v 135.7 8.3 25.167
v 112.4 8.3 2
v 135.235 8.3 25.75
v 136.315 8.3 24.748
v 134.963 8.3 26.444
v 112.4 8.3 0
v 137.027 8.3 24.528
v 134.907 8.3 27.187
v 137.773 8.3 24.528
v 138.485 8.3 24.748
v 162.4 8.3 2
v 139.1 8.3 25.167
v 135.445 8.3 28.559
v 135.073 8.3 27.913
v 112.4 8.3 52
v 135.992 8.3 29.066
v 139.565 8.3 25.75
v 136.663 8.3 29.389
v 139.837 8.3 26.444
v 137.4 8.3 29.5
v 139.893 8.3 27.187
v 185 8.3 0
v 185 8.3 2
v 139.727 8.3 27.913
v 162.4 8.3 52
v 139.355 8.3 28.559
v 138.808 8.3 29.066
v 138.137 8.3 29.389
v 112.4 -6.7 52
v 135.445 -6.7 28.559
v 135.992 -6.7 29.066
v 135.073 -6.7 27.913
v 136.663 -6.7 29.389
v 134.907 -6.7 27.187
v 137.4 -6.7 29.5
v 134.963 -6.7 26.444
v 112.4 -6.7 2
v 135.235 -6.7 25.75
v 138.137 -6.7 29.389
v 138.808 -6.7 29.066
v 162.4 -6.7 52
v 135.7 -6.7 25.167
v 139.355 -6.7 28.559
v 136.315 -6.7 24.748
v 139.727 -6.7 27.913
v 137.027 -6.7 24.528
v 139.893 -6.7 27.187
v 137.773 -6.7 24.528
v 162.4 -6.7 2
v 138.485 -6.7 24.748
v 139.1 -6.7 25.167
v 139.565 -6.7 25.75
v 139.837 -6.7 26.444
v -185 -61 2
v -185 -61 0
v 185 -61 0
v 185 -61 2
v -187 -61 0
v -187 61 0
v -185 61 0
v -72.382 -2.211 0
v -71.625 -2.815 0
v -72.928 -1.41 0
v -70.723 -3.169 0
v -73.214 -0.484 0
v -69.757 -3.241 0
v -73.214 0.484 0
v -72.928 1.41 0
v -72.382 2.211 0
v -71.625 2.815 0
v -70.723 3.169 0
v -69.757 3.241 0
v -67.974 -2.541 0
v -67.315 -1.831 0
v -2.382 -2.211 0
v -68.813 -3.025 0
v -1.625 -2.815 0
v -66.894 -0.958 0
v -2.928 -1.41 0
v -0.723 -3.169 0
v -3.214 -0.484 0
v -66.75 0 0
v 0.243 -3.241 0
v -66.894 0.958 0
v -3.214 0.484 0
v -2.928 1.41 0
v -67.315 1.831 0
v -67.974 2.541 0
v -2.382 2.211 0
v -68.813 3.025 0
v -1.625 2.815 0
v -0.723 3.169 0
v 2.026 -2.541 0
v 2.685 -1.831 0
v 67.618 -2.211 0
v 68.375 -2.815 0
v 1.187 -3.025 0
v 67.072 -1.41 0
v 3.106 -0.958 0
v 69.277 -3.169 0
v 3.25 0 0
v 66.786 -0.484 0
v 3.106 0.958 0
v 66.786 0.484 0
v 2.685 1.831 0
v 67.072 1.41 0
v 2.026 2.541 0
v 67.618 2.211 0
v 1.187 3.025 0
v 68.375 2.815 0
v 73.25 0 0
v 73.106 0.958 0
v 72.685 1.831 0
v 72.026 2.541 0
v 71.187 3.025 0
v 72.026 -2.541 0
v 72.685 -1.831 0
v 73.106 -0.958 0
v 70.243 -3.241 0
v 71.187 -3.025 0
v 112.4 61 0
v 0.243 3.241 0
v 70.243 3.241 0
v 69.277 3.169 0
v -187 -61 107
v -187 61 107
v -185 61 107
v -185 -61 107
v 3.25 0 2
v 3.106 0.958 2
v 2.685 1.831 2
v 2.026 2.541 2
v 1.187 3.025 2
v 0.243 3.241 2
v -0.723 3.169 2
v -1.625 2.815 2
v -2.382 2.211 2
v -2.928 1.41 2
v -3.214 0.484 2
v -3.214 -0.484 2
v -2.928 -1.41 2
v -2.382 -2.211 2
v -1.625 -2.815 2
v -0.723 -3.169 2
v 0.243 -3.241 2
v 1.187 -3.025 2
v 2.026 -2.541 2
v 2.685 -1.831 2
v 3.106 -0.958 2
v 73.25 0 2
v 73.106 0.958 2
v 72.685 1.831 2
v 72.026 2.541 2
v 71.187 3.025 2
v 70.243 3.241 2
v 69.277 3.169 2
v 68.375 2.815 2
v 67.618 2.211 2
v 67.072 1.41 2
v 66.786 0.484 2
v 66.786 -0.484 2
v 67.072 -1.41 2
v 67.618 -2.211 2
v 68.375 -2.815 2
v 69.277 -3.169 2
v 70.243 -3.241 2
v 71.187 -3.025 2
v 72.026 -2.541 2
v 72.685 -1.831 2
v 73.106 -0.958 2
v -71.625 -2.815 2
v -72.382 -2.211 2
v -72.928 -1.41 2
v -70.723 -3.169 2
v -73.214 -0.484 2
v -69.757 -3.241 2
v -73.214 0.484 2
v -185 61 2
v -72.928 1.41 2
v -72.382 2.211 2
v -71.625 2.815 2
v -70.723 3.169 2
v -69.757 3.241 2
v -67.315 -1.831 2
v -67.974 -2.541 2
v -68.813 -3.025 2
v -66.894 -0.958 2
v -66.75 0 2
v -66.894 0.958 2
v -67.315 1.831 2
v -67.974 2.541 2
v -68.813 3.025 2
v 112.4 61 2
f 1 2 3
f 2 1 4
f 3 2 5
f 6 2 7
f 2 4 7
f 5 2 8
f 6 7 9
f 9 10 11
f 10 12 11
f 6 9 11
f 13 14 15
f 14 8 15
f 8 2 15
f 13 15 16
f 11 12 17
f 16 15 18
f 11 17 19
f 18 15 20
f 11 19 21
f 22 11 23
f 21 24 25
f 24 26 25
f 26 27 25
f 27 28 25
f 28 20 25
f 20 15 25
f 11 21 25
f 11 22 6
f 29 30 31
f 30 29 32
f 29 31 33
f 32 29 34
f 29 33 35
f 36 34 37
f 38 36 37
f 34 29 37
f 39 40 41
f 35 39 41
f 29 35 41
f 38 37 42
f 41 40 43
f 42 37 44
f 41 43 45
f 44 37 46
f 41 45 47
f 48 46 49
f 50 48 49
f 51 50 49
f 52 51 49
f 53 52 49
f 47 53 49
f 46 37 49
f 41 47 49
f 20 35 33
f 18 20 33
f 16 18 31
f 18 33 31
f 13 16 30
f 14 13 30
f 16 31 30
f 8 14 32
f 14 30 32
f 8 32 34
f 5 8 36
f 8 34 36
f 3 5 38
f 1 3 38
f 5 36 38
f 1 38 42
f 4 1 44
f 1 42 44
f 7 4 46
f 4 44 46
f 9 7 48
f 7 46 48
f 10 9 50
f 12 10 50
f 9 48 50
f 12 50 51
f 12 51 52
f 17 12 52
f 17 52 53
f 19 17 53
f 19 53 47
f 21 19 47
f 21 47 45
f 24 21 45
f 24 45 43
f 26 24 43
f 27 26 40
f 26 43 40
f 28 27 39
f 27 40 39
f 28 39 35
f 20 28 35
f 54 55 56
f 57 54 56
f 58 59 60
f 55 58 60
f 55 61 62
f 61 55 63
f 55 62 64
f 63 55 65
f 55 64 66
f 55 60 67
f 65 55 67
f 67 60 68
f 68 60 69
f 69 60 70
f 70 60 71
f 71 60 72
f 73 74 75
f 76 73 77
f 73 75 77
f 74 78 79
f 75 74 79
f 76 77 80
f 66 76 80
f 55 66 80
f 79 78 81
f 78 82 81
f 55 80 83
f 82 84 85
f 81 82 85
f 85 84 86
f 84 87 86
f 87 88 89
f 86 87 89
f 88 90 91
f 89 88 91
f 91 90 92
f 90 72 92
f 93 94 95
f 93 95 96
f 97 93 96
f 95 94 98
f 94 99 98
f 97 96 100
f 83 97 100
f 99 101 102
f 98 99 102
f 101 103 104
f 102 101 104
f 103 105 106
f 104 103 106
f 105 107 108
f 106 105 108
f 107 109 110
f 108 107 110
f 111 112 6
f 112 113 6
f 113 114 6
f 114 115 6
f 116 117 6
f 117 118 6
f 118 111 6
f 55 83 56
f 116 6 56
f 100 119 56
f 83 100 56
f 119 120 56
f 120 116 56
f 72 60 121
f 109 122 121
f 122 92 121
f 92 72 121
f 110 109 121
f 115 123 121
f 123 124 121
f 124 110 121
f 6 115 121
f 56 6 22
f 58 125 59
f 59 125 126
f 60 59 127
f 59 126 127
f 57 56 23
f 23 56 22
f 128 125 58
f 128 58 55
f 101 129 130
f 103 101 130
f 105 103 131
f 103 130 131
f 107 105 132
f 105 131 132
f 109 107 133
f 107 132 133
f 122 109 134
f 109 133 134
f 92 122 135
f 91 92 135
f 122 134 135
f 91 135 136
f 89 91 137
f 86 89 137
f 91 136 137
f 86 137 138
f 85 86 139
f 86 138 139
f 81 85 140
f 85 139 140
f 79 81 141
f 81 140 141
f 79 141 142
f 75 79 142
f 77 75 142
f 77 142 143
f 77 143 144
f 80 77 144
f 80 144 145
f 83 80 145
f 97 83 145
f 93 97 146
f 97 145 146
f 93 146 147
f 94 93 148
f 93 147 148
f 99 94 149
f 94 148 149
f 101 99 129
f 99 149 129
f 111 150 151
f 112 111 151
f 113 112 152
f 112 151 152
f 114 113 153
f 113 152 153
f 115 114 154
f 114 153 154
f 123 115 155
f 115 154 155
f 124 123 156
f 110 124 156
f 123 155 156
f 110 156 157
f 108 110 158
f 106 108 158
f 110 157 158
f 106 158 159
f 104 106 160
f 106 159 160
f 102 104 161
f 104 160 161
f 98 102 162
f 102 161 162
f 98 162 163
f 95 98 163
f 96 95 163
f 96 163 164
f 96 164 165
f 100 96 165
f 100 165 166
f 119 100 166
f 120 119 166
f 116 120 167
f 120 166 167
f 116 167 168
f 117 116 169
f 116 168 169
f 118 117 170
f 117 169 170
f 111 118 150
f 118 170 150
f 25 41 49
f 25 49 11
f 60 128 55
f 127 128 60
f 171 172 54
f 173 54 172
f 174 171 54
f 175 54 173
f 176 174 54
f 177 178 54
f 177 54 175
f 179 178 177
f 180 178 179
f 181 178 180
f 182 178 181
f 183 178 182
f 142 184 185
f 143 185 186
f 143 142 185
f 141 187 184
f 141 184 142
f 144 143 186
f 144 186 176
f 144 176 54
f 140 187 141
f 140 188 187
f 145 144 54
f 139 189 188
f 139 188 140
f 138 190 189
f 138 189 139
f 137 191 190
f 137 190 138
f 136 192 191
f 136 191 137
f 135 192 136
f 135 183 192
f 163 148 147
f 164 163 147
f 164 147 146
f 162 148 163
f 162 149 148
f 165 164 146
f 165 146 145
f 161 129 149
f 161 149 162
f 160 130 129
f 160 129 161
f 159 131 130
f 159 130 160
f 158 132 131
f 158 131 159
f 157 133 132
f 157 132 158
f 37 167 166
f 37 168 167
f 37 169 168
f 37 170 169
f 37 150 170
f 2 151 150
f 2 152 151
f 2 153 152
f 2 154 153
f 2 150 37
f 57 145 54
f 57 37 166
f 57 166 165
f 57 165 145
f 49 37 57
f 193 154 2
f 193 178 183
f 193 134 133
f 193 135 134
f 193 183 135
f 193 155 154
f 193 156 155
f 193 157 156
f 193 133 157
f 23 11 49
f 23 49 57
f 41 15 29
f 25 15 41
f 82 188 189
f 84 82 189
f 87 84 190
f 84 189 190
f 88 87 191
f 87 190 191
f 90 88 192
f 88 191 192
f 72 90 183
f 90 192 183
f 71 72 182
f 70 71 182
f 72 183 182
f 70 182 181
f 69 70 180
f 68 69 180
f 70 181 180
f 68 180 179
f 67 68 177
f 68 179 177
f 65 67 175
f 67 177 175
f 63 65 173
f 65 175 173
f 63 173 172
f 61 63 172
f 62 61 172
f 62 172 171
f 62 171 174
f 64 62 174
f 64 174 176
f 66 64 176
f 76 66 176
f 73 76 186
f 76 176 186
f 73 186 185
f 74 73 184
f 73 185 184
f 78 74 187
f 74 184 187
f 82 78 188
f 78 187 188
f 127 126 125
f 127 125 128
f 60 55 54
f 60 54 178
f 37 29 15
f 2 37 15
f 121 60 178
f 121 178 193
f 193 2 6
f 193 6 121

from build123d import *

# Parameters (mm, degrees)
SKETCH_1_W           = 370
SKETCH_1_H           = 122
EXTRUDE_1_DEPTH      = 2
SKETCH_2_W           = 2
SKETCH_2_H           = 122
EXTRUDE_2_DEPTH      = 105
EXTRUDE_2_DEPTH_BACK = 2
SKETCH_3_W           = 50
SKETCH_3_H           = 15
EXTRUDE_3_DEPTH      = 50
SKETCH_5_W           = 2.5
SKETCH_5_H           = 15.001
SKETCH_6_W           = 72.6
SKETCH_6_H           = 52.7
CUT_EXTRUDE_1_DEPTH  = 2
SKETCH_7_R           = 3.25
CUT_EXTRUDE_2_DEPTH  = 2


with BuildPart() as part:
    # 草图1 → 凸台-拉伸1 (new body)
    with BuildSketch(Plane.XY):
        Rectangle(SKETCH_1_W, SKETCH_1_H)
    extrude(amount=EXTRUDE_1_DEPTH)

    # 草图3 → 凸台-拉伸3 (add)
    with BuildSketch(Plane.XY.offset(2)):
        with Locations((137.4, 0.8)):
            Rectangle(SKETCH_3_W, SKETCH_3_H)
    extrude(amount=EXTRUDE_3_DEPTH)

    # 草图5 → M6 螺纹孔1 (revolve, cut)
    with BuildSketch(Plane(origin=(137.4, 8.3, 27), x_dir=(0, 0, 1), z_dir=(1, 0, 0))):
        with Locations((1.25, 7.5005)):
            Rectangle(SKETCH_5_W, SKETCH_5_H)
    revolve(axis=Axis((137.4, 14.65, 27), (0, -1, 0)), mode=Mode.SUBTRACT)

    # 草图6 → 切除-拉伸1 (cut)
    with BuildSketch(Plane.XY.offset(2)):
        with Locations((148.7, 34.65)):
            Rectangle(SKETCH_6_W, SKETCH_6_H)
    extrude(amount=-CUT_EXTRUDE_1_DEPTH, mode=Mode.SUBTRACT)

    # 草图7 → 切除-拉伸2 (cut)
    with BuildSketch(Plane.XY.offset(2)):
        with Locations((-70, 0)):
            Circle(SKETCH_7_R)
        Circle(SKETCH_7_R)
        with Locations((70, 0)):
            Circle(SKETCH_7_R)
    extrude(amount=-CUT_EXTRUDE_2_DEPTH, mode=Mode.SUBTRACT)


with BuildPart() as body_2:
    # 草图2 → 凸台-拉伸2 (new body, two sides)
    with BuildSketch(Plane.XY.offset(2)) as extrude_2_sk:
        with Locations((-186, 0)):
            Rectangle(SKETCH_2_W, SKETCH_2_H)
    extrude(amount=EXTRUDE_2_DEPTH)
    extrude(extrude_2_sk.sketch, amount=-EXTRUDE_2_DEPTH_BACK)


solid = Compound([part.part, body_2.part])
